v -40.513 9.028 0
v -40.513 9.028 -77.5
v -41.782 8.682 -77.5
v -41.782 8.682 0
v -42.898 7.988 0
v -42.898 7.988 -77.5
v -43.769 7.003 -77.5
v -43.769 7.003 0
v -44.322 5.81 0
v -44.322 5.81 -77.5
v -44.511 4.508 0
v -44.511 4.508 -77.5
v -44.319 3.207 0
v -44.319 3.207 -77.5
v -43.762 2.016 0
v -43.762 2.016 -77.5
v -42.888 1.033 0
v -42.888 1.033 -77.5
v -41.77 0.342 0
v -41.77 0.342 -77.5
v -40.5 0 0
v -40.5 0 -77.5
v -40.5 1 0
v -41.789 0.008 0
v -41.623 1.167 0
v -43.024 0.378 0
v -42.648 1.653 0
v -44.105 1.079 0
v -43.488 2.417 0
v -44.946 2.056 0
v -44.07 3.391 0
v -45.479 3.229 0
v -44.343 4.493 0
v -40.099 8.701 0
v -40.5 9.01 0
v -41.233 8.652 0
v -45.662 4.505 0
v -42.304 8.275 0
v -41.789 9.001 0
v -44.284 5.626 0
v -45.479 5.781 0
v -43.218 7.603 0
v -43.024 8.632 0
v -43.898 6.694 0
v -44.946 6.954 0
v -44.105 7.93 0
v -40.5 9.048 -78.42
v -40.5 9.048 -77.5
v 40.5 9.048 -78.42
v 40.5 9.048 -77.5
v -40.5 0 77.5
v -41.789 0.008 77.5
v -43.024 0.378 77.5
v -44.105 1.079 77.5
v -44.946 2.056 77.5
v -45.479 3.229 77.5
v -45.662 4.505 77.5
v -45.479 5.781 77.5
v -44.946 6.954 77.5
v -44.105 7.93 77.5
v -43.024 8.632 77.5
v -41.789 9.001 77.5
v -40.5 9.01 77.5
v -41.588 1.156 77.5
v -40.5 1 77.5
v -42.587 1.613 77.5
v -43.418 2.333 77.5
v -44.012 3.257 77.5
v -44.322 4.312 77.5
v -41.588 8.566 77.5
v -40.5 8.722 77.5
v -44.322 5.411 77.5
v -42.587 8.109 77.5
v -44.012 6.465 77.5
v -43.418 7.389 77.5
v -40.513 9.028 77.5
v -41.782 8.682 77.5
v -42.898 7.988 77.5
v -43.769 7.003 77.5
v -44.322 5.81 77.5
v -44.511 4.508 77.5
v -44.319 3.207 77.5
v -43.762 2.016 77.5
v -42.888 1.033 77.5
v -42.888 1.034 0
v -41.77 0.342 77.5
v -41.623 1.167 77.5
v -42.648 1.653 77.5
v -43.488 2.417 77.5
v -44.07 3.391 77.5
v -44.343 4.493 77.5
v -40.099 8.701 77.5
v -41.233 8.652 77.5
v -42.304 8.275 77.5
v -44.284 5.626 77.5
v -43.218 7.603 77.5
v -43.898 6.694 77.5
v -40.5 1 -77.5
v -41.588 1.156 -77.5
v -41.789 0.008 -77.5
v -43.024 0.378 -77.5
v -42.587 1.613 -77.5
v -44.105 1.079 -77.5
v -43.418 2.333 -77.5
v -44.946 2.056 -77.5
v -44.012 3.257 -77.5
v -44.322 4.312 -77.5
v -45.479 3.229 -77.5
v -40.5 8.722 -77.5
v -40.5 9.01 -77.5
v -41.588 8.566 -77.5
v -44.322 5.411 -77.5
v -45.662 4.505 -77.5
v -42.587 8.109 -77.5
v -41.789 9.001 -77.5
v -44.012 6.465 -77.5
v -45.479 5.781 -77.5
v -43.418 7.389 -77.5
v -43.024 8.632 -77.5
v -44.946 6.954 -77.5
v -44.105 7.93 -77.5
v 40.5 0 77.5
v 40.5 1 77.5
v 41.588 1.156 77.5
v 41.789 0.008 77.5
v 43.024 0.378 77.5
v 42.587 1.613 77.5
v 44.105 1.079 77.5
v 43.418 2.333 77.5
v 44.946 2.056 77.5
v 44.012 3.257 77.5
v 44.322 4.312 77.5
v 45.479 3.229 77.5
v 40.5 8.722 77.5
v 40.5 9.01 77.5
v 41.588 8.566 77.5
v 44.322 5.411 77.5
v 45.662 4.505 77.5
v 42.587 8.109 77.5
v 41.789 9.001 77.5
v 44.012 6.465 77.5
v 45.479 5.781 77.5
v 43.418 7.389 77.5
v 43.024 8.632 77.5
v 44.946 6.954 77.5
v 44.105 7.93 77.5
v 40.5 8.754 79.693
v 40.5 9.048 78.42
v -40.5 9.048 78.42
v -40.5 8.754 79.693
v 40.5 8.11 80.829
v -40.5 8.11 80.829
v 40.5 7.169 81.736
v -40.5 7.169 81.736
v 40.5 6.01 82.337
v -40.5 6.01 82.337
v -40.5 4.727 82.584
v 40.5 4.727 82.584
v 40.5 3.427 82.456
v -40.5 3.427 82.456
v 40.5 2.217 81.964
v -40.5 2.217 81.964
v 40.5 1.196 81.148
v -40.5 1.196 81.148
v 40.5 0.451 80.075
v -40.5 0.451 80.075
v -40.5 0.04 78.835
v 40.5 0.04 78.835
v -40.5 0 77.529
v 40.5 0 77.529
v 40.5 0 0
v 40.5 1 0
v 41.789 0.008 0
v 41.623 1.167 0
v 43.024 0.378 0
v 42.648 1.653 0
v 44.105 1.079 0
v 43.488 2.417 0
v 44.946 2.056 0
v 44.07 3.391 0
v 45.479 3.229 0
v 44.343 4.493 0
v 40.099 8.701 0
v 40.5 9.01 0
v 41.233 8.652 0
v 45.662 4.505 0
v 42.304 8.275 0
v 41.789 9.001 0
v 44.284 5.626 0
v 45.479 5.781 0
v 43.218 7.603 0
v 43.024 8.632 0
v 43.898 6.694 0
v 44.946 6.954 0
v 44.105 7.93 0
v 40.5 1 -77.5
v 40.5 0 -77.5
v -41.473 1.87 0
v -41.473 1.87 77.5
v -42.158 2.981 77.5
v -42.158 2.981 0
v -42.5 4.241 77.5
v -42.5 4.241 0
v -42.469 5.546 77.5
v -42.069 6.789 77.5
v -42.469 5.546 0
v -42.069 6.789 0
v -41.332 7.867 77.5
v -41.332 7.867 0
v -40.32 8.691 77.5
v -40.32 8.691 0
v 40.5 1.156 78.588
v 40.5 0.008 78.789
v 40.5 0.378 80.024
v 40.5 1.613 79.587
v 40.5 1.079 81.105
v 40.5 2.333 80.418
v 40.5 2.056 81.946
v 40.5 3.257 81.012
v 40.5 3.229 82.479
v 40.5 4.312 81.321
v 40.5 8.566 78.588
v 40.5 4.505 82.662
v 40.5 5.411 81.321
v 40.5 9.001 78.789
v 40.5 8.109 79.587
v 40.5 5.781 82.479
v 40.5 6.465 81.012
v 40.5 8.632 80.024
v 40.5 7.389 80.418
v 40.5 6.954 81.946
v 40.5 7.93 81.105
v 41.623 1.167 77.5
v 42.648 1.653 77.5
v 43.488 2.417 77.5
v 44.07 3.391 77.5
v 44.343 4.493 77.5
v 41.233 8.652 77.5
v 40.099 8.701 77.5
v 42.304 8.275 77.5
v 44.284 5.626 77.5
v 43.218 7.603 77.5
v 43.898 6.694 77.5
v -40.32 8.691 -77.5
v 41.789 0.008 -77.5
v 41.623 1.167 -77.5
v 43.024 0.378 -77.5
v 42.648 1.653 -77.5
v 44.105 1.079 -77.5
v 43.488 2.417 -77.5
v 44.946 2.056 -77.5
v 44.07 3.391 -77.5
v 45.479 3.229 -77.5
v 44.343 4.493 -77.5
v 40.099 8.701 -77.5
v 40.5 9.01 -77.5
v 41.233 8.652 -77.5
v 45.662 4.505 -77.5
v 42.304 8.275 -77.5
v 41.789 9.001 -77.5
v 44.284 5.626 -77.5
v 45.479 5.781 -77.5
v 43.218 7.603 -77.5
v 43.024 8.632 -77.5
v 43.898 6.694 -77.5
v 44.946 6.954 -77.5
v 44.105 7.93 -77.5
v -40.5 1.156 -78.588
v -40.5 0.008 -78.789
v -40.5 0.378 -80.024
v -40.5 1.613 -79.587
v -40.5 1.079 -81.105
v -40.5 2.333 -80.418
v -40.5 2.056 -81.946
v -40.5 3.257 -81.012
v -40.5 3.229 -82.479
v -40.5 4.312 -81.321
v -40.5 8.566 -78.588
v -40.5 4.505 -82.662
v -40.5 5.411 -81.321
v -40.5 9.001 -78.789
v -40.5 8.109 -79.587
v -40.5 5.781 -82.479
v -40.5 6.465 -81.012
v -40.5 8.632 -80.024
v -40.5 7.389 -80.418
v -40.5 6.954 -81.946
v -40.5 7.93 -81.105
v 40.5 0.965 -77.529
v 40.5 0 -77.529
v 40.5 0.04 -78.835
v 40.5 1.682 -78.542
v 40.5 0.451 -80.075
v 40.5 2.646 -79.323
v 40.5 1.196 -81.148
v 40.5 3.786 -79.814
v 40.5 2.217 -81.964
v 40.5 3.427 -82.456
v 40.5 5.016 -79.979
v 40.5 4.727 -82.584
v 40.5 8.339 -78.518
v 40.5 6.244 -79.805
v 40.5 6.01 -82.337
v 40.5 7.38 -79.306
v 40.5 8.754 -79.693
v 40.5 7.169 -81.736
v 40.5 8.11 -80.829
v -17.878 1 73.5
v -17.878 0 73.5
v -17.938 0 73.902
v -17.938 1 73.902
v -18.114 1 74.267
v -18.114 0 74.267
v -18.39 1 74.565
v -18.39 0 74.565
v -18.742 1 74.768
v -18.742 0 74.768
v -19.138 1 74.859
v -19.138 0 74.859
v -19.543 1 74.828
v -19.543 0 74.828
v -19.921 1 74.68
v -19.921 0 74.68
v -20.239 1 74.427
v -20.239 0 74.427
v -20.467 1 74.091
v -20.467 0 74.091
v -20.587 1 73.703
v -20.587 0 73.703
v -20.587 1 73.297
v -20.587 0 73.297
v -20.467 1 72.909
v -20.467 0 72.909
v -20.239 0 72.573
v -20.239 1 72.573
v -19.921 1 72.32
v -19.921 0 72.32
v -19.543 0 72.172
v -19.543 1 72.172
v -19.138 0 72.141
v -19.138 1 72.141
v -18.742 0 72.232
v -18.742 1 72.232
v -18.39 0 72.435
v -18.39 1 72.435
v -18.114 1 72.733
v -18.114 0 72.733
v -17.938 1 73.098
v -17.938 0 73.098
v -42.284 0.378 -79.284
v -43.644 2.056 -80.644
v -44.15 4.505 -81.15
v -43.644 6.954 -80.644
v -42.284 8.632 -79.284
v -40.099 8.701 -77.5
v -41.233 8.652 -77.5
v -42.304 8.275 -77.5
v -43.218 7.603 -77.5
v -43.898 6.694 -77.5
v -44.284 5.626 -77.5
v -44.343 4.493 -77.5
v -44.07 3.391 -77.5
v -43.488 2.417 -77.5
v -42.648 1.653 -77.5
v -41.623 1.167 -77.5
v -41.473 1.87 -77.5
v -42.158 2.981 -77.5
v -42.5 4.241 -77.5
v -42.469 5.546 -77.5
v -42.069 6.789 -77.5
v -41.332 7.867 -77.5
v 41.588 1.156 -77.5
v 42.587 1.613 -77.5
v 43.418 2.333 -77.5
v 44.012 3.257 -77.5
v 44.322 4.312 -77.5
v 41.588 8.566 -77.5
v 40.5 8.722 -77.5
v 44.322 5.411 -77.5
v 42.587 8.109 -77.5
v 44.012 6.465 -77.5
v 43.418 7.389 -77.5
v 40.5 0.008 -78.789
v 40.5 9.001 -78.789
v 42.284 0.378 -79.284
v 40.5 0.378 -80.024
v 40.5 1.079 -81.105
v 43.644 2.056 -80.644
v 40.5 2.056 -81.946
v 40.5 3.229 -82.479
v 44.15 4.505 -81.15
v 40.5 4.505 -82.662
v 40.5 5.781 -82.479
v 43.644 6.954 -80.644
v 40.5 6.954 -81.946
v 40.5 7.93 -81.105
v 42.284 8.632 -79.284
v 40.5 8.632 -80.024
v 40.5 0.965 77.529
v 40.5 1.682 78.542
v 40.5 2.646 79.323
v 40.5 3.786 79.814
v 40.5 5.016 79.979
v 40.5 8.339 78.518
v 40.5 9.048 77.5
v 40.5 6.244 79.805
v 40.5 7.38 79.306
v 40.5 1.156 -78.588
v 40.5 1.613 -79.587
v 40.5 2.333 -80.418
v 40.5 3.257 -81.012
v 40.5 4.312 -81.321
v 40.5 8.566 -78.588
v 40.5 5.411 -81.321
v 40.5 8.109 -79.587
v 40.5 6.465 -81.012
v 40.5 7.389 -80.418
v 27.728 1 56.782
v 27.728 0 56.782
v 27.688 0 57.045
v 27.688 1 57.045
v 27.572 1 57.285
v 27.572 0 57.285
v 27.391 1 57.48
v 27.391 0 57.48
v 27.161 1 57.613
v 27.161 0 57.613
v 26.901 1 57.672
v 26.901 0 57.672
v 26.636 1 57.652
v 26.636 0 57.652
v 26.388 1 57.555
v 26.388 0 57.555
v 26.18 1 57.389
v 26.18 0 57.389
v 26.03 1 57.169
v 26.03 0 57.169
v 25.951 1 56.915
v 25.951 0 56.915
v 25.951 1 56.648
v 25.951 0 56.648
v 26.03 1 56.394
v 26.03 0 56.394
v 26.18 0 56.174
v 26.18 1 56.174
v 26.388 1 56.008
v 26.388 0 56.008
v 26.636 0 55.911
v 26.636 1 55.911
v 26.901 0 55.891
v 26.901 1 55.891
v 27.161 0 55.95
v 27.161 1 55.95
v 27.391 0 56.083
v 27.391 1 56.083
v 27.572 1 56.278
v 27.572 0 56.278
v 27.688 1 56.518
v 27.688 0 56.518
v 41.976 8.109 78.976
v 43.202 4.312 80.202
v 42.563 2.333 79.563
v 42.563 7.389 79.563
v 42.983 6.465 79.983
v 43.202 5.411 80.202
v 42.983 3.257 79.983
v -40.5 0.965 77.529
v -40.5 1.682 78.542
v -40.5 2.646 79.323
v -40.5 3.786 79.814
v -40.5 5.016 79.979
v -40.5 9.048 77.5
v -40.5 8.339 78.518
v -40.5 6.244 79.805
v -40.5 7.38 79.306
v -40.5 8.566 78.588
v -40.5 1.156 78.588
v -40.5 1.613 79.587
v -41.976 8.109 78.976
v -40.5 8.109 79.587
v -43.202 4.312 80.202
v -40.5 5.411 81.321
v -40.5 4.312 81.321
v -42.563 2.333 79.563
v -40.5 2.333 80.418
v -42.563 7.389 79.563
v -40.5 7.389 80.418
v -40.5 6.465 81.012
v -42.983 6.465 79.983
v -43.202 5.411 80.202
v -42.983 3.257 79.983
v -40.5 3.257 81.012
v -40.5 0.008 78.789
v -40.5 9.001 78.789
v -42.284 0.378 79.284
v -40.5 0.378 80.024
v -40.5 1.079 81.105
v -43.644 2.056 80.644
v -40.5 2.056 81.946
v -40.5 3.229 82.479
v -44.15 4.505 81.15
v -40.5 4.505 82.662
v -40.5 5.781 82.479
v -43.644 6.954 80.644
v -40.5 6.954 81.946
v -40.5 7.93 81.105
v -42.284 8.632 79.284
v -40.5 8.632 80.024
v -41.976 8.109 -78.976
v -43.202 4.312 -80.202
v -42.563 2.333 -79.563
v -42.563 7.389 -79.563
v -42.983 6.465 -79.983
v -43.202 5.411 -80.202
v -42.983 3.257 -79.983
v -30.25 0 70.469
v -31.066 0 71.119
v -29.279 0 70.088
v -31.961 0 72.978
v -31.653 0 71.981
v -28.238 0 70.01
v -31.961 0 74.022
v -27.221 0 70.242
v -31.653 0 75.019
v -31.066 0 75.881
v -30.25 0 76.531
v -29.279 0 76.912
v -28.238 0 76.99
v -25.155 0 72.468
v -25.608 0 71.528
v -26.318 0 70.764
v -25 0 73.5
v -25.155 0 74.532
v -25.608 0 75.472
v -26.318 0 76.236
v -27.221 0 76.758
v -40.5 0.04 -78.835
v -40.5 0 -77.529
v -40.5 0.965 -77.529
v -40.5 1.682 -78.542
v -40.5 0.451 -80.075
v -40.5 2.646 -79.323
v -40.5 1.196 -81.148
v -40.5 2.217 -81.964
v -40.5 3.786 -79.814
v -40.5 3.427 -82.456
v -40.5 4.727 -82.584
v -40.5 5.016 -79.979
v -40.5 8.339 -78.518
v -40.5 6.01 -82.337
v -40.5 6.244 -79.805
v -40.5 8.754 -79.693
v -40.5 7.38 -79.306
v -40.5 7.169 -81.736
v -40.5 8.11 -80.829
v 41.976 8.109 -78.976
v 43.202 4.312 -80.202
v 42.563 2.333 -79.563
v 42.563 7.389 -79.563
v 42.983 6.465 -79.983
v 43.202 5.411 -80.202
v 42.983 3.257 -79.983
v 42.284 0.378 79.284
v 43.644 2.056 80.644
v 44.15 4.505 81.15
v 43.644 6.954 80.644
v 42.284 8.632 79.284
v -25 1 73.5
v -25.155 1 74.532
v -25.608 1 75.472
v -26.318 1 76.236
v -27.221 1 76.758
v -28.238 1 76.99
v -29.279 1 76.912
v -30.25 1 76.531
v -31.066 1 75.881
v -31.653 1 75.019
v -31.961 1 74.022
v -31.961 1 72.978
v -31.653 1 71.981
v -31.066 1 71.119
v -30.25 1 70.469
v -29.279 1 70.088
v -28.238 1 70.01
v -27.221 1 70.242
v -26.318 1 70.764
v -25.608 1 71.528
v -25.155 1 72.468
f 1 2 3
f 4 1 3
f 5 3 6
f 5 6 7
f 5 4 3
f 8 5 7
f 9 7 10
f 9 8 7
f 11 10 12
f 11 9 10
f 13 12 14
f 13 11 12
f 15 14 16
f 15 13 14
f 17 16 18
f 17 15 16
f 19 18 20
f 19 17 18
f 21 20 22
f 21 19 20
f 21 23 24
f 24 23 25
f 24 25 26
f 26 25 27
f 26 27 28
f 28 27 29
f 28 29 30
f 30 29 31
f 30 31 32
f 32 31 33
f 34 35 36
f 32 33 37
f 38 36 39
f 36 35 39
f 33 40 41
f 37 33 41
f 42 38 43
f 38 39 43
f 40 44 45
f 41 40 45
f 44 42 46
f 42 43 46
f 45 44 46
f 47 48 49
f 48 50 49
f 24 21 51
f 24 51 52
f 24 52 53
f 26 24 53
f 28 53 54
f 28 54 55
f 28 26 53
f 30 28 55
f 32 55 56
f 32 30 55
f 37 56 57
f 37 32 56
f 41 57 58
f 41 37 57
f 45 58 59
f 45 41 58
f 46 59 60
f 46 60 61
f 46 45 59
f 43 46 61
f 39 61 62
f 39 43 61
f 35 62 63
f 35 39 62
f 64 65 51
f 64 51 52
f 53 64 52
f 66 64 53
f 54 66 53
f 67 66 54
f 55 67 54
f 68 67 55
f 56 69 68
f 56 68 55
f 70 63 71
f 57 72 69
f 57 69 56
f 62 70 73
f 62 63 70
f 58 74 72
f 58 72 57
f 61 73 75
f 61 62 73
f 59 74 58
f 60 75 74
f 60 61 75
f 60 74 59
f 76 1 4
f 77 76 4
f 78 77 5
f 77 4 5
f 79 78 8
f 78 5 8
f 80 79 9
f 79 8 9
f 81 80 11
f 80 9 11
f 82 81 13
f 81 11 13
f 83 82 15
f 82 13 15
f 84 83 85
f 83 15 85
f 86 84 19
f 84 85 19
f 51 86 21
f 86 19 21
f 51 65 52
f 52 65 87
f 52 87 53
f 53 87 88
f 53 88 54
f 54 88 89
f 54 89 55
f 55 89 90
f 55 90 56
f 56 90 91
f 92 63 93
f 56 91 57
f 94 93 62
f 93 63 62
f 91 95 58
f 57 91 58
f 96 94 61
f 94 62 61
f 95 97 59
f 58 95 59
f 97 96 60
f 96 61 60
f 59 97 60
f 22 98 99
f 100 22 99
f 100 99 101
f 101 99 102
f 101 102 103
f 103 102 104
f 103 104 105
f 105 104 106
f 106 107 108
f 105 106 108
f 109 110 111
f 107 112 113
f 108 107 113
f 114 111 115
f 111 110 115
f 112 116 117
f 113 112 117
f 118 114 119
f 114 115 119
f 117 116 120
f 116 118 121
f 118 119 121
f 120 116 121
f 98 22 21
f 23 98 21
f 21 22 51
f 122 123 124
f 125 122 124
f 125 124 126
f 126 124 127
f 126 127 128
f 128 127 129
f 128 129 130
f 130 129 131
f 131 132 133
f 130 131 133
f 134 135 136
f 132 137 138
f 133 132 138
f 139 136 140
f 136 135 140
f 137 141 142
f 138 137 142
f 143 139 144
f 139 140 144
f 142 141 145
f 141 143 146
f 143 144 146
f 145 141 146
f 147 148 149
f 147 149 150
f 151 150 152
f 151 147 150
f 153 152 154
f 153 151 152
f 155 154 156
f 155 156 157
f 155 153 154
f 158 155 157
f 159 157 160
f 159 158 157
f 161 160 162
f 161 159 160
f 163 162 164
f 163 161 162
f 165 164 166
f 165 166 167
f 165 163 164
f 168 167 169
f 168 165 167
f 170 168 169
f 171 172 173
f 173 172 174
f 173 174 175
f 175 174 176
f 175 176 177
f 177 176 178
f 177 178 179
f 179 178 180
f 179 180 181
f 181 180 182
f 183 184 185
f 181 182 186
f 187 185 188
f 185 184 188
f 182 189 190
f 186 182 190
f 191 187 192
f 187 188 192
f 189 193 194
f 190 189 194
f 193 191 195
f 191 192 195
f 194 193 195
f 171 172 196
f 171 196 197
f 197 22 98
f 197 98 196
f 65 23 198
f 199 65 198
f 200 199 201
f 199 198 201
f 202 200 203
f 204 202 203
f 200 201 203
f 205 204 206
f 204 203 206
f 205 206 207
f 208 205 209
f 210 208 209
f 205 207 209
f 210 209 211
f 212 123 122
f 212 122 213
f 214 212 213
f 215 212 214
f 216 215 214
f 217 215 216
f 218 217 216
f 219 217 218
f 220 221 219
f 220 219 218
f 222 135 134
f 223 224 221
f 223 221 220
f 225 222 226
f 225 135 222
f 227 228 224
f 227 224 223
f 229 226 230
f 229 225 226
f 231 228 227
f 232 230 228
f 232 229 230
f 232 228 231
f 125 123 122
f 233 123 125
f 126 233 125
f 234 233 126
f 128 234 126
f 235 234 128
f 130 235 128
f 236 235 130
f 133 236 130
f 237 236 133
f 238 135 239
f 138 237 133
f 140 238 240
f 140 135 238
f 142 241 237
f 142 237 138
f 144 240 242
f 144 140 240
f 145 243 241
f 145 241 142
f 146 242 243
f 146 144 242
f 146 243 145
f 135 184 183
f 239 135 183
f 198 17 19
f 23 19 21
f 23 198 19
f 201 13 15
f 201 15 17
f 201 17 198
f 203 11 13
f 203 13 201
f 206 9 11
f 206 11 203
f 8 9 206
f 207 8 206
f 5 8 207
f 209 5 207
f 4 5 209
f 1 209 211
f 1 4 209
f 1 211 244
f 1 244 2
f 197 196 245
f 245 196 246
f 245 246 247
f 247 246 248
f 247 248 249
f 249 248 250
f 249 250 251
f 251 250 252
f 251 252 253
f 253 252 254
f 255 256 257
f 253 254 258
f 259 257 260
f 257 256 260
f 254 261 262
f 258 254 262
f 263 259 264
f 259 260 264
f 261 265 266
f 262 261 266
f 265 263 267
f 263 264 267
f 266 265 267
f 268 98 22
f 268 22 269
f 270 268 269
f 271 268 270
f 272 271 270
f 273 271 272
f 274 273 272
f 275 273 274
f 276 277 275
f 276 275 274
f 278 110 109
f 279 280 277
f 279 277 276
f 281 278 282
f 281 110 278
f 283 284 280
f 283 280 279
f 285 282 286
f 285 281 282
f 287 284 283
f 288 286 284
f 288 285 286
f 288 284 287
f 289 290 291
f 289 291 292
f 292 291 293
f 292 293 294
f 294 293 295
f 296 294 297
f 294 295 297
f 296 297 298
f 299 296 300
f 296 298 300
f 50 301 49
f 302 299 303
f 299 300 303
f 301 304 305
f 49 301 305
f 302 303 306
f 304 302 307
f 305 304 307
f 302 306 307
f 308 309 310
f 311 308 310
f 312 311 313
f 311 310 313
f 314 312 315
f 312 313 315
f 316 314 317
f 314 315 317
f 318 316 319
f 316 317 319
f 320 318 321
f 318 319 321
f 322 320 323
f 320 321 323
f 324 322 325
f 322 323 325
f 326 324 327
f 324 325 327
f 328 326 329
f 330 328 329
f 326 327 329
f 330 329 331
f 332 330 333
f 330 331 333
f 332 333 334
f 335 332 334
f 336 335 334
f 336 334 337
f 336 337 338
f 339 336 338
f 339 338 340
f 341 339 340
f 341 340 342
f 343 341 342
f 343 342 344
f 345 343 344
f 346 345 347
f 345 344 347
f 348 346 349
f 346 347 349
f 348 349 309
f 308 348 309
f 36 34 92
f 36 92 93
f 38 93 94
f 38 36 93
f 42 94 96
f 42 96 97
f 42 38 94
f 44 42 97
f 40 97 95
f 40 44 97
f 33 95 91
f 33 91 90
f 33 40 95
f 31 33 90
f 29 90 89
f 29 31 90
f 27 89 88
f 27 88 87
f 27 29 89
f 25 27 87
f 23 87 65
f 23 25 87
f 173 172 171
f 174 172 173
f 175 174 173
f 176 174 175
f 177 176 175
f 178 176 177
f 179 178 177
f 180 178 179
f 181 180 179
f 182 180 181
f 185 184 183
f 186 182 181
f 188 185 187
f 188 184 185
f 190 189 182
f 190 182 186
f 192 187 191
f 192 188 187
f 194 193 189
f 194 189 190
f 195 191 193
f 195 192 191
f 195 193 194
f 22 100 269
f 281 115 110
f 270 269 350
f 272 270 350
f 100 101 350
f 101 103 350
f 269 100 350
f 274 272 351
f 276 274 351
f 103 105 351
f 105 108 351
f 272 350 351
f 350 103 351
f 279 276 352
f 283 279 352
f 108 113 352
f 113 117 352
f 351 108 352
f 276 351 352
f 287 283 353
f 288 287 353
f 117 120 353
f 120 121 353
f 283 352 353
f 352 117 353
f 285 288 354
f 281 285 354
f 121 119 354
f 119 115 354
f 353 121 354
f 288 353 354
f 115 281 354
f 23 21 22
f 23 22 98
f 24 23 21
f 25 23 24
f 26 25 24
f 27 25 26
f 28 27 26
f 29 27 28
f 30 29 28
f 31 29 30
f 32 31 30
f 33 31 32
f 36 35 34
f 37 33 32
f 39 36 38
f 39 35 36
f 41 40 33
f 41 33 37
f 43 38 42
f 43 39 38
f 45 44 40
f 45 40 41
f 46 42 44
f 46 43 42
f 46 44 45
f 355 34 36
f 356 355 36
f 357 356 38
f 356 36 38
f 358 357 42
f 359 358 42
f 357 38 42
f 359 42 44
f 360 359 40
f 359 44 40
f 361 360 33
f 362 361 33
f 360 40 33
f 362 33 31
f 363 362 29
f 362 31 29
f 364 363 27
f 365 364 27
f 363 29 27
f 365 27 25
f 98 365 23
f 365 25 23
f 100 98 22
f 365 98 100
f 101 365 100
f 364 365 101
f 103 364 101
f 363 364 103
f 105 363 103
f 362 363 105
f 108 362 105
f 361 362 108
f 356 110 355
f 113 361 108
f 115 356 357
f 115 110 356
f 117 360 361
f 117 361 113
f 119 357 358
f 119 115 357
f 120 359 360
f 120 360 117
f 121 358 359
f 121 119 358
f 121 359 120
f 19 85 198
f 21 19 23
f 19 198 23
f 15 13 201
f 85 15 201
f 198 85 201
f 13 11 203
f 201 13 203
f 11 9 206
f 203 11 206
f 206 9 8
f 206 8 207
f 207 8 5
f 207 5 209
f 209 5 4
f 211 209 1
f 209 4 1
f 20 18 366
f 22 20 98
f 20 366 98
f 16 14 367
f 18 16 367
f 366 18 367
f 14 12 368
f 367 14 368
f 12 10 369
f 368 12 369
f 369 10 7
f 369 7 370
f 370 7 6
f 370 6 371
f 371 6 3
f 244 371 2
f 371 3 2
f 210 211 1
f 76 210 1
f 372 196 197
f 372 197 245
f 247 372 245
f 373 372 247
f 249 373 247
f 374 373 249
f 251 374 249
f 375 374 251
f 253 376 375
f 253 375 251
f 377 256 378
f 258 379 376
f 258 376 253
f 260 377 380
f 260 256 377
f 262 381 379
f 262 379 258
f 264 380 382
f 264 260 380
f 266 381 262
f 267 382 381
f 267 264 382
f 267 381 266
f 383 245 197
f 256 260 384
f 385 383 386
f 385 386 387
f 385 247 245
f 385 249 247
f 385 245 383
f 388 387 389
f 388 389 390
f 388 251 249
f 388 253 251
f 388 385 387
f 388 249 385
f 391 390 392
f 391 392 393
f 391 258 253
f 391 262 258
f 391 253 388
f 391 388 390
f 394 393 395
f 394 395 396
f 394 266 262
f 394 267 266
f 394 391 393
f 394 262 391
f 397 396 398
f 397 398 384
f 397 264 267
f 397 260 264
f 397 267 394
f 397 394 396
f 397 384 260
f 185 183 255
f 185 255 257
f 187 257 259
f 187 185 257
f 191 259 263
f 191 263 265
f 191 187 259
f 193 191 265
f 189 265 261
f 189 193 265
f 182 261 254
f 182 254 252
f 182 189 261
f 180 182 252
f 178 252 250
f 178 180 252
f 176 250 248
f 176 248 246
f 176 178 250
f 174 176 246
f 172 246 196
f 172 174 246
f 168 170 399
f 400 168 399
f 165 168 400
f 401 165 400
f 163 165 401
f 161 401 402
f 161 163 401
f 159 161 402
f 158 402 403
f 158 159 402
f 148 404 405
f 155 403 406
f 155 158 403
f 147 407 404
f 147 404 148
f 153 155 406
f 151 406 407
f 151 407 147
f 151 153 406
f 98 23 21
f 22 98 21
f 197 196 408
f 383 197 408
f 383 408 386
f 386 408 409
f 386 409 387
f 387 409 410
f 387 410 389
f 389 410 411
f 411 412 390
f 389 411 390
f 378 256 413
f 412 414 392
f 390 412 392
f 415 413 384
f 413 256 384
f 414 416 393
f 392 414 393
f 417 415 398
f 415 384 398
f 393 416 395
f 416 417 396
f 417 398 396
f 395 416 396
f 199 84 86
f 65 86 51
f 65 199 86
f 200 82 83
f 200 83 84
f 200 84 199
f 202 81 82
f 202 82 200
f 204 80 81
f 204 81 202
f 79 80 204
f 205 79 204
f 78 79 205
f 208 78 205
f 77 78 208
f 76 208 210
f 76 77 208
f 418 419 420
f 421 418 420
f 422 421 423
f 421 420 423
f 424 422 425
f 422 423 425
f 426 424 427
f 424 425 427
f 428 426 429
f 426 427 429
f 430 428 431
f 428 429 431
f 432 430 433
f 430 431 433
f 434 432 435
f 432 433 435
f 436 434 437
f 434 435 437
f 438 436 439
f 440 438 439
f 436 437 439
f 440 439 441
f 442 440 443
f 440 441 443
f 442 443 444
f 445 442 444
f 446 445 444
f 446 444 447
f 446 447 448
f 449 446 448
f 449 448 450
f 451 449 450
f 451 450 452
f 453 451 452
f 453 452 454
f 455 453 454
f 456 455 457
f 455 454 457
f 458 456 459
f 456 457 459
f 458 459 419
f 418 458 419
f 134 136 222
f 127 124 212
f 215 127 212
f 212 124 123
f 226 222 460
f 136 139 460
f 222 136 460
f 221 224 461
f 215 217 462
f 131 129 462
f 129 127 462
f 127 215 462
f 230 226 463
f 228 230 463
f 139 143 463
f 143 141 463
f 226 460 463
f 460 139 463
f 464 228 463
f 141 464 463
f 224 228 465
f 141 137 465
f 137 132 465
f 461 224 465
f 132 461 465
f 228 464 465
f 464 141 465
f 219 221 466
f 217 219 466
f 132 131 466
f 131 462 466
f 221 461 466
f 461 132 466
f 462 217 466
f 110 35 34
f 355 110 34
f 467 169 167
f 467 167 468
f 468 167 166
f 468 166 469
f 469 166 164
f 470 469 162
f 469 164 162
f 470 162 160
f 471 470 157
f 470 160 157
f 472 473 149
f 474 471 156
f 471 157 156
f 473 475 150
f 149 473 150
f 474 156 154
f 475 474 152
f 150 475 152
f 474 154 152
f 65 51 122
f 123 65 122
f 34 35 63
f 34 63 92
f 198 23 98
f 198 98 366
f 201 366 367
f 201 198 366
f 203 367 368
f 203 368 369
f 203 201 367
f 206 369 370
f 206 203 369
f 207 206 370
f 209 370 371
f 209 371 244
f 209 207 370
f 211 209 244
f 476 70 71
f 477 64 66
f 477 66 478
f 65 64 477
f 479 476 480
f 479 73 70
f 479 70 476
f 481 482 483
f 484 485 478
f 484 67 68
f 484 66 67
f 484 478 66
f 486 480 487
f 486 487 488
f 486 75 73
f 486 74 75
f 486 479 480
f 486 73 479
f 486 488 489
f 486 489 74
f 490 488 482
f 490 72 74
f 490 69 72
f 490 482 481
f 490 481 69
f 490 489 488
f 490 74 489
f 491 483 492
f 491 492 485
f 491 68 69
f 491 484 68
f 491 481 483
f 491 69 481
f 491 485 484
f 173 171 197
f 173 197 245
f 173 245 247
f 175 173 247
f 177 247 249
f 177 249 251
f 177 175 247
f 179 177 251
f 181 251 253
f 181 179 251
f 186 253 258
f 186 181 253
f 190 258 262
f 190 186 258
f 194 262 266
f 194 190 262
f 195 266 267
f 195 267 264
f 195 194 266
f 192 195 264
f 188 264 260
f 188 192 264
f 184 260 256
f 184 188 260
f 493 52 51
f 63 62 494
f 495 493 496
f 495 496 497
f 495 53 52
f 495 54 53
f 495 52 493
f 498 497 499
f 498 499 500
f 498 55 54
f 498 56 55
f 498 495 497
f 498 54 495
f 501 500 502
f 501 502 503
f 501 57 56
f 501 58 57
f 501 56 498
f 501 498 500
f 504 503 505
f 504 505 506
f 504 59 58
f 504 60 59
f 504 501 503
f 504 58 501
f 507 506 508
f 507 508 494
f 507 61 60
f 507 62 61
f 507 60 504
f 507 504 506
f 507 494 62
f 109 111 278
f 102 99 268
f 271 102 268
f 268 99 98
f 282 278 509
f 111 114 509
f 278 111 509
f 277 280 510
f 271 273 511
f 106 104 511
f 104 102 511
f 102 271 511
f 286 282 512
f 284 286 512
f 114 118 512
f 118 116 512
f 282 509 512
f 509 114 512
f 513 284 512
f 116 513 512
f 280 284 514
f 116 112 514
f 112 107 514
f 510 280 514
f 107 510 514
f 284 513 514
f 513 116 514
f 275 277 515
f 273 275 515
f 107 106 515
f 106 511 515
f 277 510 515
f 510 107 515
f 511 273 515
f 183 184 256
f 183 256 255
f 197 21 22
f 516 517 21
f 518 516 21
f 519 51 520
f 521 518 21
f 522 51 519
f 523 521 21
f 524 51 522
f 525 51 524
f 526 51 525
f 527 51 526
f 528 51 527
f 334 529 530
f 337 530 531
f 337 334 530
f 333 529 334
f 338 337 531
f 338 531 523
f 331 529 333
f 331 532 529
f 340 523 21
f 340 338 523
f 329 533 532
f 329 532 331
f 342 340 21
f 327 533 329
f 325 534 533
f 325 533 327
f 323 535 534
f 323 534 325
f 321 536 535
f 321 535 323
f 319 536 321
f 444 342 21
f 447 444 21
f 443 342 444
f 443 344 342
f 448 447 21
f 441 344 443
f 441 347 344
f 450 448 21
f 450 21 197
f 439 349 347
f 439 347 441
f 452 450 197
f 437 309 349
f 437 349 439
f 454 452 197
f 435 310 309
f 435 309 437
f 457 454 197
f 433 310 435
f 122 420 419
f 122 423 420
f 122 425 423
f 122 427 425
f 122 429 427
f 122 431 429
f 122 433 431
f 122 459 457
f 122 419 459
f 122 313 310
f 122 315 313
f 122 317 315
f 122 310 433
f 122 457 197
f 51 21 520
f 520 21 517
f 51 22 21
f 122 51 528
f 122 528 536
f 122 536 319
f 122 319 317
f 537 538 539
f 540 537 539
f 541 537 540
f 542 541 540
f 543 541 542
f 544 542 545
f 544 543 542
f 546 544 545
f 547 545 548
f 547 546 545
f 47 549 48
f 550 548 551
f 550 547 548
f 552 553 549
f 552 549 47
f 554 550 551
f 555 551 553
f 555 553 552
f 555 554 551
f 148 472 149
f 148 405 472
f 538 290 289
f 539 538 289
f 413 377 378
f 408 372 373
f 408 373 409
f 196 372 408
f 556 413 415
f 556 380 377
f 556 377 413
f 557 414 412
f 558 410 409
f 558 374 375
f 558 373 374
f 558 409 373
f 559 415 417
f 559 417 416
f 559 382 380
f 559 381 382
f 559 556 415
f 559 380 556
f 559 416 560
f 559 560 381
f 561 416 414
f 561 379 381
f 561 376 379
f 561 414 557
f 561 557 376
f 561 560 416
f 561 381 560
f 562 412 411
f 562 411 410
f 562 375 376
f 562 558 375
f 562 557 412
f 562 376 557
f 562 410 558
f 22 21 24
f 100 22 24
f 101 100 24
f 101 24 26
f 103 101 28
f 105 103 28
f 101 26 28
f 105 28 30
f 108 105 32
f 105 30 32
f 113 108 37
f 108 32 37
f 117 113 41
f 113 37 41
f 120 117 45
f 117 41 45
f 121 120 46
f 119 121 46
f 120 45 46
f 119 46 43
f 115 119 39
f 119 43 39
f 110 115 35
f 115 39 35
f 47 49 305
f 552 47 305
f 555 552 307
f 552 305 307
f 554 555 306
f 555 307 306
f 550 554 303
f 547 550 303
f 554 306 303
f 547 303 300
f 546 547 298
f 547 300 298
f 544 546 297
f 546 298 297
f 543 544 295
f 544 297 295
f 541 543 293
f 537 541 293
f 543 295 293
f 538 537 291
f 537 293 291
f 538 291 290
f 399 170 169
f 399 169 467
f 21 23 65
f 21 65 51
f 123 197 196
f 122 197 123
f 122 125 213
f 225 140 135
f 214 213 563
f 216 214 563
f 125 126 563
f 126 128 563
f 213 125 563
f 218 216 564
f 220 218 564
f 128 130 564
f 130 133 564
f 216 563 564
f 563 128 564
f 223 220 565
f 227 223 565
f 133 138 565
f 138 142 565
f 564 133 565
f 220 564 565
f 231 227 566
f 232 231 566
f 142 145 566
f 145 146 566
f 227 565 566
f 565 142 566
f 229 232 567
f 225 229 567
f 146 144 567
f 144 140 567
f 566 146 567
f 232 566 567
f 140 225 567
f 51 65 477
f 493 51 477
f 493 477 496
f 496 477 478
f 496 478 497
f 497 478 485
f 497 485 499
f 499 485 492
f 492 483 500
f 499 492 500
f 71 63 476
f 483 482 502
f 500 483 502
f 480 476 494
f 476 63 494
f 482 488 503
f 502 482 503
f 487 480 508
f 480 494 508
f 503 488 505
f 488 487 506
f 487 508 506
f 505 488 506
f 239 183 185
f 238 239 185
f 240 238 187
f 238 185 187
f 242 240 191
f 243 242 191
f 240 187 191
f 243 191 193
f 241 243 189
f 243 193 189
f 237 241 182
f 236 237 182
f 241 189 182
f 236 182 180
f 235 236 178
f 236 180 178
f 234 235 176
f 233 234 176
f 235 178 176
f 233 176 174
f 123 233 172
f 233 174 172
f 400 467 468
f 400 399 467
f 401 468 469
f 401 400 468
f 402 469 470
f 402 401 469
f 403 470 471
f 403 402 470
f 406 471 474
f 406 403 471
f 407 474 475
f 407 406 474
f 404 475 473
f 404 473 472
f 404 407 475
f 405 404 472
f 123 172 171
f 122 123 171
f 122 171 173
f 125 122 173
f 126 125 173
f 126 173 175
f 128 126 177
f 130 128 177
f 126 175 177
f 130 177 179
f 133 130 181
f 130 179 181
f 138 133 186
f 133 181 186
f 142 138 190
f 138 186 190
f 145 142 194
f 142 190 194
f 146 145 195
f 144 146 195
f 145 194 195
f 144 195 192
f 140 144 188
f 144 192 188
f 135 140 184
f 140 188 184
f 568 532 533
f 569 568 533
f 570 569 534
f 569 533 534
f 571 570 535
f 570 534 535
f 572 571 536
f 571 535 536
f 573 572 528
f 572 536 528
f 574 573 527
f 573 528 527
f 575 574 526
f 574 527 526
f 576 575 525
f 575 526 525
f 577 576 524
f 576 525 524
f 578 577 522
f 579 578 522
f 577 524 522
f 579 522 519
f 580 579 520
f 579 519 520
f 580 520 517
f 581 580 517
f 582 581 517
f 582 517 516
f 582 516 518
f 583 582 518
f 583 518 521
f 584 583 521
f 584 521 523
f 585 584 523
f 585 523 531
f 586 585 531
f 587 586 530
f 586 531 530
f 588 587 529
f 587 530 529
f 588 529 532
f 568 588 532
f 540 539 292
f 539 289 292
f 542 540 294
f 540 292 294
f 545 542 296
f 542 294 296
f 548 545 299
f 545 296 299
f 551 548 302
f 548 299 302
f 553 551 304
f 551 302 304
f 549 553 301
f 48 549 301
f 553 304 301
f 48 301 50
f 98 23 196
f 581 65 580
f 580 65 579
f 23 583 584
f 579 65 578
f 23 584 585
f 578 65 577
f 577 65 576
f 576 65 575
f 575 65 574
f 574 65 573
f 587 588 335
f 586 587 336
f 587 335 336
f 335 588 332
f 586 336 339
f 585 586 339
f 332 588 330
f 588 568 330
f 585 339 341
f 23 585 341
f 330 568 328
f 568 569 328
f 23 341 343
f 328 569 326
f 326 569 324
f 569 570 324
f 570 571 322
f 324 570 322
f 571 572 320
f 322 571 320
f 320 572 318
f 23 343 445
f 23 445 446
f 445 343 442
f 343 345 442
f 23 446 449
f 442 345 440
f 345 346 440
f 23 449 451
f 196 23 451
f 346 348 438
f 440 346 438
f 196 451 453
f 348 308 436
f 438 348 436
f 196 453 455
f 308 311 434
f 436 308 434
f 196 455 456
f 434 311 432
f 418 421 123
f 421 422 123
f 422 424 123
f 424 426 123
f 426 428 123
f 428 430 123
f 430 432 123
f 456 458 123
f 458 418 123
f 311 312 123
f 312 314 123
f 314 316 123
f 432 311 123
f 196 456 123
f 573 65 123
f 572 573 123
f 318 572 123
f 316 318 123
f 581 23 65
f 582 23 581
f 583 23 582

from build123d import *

# Parameters (mm, degrees)
F0_W      = 81
F0_H      = 155
F0_R      = 3.5
F0_R_2    = 1.3623510681
F0_R_3    = 0.8931999414
F2_DEPTH  = 1
F3_DEPTH  = 77.5000736
F4_DEPTH  = 77.5000736
F6_DEPTH  = 40.5003
F7_DEPTH  = 40.5003
F10_ANGLE = 90


with BuildPart() as f2:
    # F0 (on Front) → F2 (new body)
    with BuildSketch(Plane.XZ):
        Rectangle(F0_W, F0_H)
        with Locations((-28.5, 73.5)):
            Circle(F0_R, mode=Mode.SUBTRACT)
        with Locations((-19.2399080843, 73.5)):
            Circle(F0_R_2, mode=Mode.SUBTRACT)
        with Locations((26.8343064, 56.7815168)):
            Circle(F0_R_3, mode=Mode.SUBTRACT)
    extrude(amount=-F2_DEPTH)

    # F1 (on Top) → F3, piece 2 (join)
    with BuildSketch(Plane.XY):
        with BuildLine():
            Line((-40.3195688207, 8.6905952365), (-40.5130350174, 9.0282323907))
            ThreePointArc((-40.5130350174, 9.0282323907), (-44.5105638324, 4.5082722956), (-40.4998585582, 0))
            Line((-40.4998585582, 0), (-40.4998585582, 1))
            ThreePointArc((-40.4998585582, 1), (-42.5314511263, 4.8950372644), (-40.3195688207, 8.6905952365))
        make_face()
    extrude(amount=F3_DEPTH)


with BuildPart() as f3:
    # F1 (on Top) → F3 (new body)
    with BuildSketch(Plane.XY):
        with BuildLine():
            Line((40.5000858009, 1), (40.5000858009, 0))
            ThreePointArc((40.5000858009, 0), (45.6620669504, 4.5047616586), (40.5000858009, 9.0095233172))
            Line((40.5000858009, 9.0095233172), (40.0991290808, 8.7012909353))
            ThreePointArc((40.0991290808, 8.7012909353), (44.3555760459, 5.0618136838), (40.5000858009, 1))
        make_face()
    extrude(amount=F3_DEPTH)


with BuildPart() as f4:
    # F1 (on Top) → F4 (new body)
    with BuildSketch(Plane.XY):
        with BuildLine():
            Line((40.5000858009, 1), (40.5000858009, 0))
            ThreePointArc((40.5000858009, 0), (45.6620669504, 4.5047616586), (40.5000858009, 9.0095233172))
            Line((40.5000858009, 9.0095233172), (40.0991290808, 8.7012909353))
            ThreePointArc((40.0991290808, 8.7012909353), (44.3555760459, 5.0618136838), (40.5000858009, 1))
        make_face()
    extrude(amount=-F4_DEPTH)


with BuildPart() as f4b:
    # F1 (on Top) → F4, piece 2 (new body)
    with BuildSketch(Plane.XY):
        with BuildLine():
            Line((-40.3195688207, 8.6905952365), (-40.5130350174, 9.0282323907))
            ThreePointArc((-40.5130350174, 9.0282323907), (-44.5105638324, 4.5082722956), (-40.4998585582, 0))
            Line((-40.4998585582, 0), (-40.4998585582, 1))
            ThreePointArc((-40.4998585582, 1), (-42.5314511263, 4.8950372644), (-40.3195688207, 8.6905952365))
        make_face()
    extrude(amount=-F4_DEPTH)


with BuildPart() as f6:
    # F5 (on Right) → F6 (new body)
    with BuildSketch(Plane.YZ):
        with BuildLine():
            Line((9.0484265238, 77.5000676513), (9.0484265238, 78.41977737))
            ThreePointArc((9.0484265238, 78.41977737), (4.072060154, 82.5672864525), (0, 77.5289950816))
            Line((0, 77.5289950816), (0.9652, 77.5289950816))
            ThreePointArc((0.9652, 77.5289950816), (5.0156315465, 79.9786351909), (9.0484265238, 77.5000676513))
        make_face()
    extrude(amount=F6_DEPTH)

    # F7 (add): a face of the model
    f7_faces = [f6.faces().sort_by_distance(p)[0] for p in [
        (0, 4.2209866558, 80.4101695334),
    ]]
    extrude(f7_faces, amount=F7_DEPTH)


with BuildPart() as f8_1:
    # F8: instance of F6
    add(f6.part.mirror(Plane.XY))


with BuildPart() as f10:
    # F9 (on face) → F10 (revolve)
    with BuildSketch(Plane.XY.offset(77.5000736)):
        with BuildLine():
            ThreePointArc((40.5000858009, 8.7221295006), (44.3607983627, 4.8610647503), (40.5000858009, 1))
            Line((40.5000858009, 1), (40.5000858009, 0))
            ThreePointArc((40.5000858009, 0), (45.6620669504, 4.5047616586), (40.5000858009, 9.0095233172))
            Line((40.5000858009, 9.0095233172), (40.5000858009, 8.7221295006))
        make_face()
    revolve(axis=Axis((40.5000858009, 4.8610647503, 77.5000736), (0, -1, 0)), revolution_arc=F10_ANGLE)


with BuildPart() as f11_1:
    # F11: instance of F10
    add(f10.part.mirror(Plane.XY))


with BuildPart() as f12_1:
    # F12: instance of F11_1
    add(f11_1.part.mirror(Plane.YZ))


with BuildPart() as f12_2:
    # F12: instance of F10
    add(f10.part.mirror(Plane.YZ))


with BuildPart() as f13_1:
    # F13: instance of F4
    add(f4.part.mirror(Plane.YZ))


with BuildPart() as f13_2:
    # F13: instance of F3
    add(f3.part.mirror(Plane.YZ))


solid = Compound([f2.part, f3.part, f4.part, f4b.part, f6.part, f8_1.part, f10.part, f11_1.part, f12_1.part, f12_2.part, f13_1.part, f13_2.part])
